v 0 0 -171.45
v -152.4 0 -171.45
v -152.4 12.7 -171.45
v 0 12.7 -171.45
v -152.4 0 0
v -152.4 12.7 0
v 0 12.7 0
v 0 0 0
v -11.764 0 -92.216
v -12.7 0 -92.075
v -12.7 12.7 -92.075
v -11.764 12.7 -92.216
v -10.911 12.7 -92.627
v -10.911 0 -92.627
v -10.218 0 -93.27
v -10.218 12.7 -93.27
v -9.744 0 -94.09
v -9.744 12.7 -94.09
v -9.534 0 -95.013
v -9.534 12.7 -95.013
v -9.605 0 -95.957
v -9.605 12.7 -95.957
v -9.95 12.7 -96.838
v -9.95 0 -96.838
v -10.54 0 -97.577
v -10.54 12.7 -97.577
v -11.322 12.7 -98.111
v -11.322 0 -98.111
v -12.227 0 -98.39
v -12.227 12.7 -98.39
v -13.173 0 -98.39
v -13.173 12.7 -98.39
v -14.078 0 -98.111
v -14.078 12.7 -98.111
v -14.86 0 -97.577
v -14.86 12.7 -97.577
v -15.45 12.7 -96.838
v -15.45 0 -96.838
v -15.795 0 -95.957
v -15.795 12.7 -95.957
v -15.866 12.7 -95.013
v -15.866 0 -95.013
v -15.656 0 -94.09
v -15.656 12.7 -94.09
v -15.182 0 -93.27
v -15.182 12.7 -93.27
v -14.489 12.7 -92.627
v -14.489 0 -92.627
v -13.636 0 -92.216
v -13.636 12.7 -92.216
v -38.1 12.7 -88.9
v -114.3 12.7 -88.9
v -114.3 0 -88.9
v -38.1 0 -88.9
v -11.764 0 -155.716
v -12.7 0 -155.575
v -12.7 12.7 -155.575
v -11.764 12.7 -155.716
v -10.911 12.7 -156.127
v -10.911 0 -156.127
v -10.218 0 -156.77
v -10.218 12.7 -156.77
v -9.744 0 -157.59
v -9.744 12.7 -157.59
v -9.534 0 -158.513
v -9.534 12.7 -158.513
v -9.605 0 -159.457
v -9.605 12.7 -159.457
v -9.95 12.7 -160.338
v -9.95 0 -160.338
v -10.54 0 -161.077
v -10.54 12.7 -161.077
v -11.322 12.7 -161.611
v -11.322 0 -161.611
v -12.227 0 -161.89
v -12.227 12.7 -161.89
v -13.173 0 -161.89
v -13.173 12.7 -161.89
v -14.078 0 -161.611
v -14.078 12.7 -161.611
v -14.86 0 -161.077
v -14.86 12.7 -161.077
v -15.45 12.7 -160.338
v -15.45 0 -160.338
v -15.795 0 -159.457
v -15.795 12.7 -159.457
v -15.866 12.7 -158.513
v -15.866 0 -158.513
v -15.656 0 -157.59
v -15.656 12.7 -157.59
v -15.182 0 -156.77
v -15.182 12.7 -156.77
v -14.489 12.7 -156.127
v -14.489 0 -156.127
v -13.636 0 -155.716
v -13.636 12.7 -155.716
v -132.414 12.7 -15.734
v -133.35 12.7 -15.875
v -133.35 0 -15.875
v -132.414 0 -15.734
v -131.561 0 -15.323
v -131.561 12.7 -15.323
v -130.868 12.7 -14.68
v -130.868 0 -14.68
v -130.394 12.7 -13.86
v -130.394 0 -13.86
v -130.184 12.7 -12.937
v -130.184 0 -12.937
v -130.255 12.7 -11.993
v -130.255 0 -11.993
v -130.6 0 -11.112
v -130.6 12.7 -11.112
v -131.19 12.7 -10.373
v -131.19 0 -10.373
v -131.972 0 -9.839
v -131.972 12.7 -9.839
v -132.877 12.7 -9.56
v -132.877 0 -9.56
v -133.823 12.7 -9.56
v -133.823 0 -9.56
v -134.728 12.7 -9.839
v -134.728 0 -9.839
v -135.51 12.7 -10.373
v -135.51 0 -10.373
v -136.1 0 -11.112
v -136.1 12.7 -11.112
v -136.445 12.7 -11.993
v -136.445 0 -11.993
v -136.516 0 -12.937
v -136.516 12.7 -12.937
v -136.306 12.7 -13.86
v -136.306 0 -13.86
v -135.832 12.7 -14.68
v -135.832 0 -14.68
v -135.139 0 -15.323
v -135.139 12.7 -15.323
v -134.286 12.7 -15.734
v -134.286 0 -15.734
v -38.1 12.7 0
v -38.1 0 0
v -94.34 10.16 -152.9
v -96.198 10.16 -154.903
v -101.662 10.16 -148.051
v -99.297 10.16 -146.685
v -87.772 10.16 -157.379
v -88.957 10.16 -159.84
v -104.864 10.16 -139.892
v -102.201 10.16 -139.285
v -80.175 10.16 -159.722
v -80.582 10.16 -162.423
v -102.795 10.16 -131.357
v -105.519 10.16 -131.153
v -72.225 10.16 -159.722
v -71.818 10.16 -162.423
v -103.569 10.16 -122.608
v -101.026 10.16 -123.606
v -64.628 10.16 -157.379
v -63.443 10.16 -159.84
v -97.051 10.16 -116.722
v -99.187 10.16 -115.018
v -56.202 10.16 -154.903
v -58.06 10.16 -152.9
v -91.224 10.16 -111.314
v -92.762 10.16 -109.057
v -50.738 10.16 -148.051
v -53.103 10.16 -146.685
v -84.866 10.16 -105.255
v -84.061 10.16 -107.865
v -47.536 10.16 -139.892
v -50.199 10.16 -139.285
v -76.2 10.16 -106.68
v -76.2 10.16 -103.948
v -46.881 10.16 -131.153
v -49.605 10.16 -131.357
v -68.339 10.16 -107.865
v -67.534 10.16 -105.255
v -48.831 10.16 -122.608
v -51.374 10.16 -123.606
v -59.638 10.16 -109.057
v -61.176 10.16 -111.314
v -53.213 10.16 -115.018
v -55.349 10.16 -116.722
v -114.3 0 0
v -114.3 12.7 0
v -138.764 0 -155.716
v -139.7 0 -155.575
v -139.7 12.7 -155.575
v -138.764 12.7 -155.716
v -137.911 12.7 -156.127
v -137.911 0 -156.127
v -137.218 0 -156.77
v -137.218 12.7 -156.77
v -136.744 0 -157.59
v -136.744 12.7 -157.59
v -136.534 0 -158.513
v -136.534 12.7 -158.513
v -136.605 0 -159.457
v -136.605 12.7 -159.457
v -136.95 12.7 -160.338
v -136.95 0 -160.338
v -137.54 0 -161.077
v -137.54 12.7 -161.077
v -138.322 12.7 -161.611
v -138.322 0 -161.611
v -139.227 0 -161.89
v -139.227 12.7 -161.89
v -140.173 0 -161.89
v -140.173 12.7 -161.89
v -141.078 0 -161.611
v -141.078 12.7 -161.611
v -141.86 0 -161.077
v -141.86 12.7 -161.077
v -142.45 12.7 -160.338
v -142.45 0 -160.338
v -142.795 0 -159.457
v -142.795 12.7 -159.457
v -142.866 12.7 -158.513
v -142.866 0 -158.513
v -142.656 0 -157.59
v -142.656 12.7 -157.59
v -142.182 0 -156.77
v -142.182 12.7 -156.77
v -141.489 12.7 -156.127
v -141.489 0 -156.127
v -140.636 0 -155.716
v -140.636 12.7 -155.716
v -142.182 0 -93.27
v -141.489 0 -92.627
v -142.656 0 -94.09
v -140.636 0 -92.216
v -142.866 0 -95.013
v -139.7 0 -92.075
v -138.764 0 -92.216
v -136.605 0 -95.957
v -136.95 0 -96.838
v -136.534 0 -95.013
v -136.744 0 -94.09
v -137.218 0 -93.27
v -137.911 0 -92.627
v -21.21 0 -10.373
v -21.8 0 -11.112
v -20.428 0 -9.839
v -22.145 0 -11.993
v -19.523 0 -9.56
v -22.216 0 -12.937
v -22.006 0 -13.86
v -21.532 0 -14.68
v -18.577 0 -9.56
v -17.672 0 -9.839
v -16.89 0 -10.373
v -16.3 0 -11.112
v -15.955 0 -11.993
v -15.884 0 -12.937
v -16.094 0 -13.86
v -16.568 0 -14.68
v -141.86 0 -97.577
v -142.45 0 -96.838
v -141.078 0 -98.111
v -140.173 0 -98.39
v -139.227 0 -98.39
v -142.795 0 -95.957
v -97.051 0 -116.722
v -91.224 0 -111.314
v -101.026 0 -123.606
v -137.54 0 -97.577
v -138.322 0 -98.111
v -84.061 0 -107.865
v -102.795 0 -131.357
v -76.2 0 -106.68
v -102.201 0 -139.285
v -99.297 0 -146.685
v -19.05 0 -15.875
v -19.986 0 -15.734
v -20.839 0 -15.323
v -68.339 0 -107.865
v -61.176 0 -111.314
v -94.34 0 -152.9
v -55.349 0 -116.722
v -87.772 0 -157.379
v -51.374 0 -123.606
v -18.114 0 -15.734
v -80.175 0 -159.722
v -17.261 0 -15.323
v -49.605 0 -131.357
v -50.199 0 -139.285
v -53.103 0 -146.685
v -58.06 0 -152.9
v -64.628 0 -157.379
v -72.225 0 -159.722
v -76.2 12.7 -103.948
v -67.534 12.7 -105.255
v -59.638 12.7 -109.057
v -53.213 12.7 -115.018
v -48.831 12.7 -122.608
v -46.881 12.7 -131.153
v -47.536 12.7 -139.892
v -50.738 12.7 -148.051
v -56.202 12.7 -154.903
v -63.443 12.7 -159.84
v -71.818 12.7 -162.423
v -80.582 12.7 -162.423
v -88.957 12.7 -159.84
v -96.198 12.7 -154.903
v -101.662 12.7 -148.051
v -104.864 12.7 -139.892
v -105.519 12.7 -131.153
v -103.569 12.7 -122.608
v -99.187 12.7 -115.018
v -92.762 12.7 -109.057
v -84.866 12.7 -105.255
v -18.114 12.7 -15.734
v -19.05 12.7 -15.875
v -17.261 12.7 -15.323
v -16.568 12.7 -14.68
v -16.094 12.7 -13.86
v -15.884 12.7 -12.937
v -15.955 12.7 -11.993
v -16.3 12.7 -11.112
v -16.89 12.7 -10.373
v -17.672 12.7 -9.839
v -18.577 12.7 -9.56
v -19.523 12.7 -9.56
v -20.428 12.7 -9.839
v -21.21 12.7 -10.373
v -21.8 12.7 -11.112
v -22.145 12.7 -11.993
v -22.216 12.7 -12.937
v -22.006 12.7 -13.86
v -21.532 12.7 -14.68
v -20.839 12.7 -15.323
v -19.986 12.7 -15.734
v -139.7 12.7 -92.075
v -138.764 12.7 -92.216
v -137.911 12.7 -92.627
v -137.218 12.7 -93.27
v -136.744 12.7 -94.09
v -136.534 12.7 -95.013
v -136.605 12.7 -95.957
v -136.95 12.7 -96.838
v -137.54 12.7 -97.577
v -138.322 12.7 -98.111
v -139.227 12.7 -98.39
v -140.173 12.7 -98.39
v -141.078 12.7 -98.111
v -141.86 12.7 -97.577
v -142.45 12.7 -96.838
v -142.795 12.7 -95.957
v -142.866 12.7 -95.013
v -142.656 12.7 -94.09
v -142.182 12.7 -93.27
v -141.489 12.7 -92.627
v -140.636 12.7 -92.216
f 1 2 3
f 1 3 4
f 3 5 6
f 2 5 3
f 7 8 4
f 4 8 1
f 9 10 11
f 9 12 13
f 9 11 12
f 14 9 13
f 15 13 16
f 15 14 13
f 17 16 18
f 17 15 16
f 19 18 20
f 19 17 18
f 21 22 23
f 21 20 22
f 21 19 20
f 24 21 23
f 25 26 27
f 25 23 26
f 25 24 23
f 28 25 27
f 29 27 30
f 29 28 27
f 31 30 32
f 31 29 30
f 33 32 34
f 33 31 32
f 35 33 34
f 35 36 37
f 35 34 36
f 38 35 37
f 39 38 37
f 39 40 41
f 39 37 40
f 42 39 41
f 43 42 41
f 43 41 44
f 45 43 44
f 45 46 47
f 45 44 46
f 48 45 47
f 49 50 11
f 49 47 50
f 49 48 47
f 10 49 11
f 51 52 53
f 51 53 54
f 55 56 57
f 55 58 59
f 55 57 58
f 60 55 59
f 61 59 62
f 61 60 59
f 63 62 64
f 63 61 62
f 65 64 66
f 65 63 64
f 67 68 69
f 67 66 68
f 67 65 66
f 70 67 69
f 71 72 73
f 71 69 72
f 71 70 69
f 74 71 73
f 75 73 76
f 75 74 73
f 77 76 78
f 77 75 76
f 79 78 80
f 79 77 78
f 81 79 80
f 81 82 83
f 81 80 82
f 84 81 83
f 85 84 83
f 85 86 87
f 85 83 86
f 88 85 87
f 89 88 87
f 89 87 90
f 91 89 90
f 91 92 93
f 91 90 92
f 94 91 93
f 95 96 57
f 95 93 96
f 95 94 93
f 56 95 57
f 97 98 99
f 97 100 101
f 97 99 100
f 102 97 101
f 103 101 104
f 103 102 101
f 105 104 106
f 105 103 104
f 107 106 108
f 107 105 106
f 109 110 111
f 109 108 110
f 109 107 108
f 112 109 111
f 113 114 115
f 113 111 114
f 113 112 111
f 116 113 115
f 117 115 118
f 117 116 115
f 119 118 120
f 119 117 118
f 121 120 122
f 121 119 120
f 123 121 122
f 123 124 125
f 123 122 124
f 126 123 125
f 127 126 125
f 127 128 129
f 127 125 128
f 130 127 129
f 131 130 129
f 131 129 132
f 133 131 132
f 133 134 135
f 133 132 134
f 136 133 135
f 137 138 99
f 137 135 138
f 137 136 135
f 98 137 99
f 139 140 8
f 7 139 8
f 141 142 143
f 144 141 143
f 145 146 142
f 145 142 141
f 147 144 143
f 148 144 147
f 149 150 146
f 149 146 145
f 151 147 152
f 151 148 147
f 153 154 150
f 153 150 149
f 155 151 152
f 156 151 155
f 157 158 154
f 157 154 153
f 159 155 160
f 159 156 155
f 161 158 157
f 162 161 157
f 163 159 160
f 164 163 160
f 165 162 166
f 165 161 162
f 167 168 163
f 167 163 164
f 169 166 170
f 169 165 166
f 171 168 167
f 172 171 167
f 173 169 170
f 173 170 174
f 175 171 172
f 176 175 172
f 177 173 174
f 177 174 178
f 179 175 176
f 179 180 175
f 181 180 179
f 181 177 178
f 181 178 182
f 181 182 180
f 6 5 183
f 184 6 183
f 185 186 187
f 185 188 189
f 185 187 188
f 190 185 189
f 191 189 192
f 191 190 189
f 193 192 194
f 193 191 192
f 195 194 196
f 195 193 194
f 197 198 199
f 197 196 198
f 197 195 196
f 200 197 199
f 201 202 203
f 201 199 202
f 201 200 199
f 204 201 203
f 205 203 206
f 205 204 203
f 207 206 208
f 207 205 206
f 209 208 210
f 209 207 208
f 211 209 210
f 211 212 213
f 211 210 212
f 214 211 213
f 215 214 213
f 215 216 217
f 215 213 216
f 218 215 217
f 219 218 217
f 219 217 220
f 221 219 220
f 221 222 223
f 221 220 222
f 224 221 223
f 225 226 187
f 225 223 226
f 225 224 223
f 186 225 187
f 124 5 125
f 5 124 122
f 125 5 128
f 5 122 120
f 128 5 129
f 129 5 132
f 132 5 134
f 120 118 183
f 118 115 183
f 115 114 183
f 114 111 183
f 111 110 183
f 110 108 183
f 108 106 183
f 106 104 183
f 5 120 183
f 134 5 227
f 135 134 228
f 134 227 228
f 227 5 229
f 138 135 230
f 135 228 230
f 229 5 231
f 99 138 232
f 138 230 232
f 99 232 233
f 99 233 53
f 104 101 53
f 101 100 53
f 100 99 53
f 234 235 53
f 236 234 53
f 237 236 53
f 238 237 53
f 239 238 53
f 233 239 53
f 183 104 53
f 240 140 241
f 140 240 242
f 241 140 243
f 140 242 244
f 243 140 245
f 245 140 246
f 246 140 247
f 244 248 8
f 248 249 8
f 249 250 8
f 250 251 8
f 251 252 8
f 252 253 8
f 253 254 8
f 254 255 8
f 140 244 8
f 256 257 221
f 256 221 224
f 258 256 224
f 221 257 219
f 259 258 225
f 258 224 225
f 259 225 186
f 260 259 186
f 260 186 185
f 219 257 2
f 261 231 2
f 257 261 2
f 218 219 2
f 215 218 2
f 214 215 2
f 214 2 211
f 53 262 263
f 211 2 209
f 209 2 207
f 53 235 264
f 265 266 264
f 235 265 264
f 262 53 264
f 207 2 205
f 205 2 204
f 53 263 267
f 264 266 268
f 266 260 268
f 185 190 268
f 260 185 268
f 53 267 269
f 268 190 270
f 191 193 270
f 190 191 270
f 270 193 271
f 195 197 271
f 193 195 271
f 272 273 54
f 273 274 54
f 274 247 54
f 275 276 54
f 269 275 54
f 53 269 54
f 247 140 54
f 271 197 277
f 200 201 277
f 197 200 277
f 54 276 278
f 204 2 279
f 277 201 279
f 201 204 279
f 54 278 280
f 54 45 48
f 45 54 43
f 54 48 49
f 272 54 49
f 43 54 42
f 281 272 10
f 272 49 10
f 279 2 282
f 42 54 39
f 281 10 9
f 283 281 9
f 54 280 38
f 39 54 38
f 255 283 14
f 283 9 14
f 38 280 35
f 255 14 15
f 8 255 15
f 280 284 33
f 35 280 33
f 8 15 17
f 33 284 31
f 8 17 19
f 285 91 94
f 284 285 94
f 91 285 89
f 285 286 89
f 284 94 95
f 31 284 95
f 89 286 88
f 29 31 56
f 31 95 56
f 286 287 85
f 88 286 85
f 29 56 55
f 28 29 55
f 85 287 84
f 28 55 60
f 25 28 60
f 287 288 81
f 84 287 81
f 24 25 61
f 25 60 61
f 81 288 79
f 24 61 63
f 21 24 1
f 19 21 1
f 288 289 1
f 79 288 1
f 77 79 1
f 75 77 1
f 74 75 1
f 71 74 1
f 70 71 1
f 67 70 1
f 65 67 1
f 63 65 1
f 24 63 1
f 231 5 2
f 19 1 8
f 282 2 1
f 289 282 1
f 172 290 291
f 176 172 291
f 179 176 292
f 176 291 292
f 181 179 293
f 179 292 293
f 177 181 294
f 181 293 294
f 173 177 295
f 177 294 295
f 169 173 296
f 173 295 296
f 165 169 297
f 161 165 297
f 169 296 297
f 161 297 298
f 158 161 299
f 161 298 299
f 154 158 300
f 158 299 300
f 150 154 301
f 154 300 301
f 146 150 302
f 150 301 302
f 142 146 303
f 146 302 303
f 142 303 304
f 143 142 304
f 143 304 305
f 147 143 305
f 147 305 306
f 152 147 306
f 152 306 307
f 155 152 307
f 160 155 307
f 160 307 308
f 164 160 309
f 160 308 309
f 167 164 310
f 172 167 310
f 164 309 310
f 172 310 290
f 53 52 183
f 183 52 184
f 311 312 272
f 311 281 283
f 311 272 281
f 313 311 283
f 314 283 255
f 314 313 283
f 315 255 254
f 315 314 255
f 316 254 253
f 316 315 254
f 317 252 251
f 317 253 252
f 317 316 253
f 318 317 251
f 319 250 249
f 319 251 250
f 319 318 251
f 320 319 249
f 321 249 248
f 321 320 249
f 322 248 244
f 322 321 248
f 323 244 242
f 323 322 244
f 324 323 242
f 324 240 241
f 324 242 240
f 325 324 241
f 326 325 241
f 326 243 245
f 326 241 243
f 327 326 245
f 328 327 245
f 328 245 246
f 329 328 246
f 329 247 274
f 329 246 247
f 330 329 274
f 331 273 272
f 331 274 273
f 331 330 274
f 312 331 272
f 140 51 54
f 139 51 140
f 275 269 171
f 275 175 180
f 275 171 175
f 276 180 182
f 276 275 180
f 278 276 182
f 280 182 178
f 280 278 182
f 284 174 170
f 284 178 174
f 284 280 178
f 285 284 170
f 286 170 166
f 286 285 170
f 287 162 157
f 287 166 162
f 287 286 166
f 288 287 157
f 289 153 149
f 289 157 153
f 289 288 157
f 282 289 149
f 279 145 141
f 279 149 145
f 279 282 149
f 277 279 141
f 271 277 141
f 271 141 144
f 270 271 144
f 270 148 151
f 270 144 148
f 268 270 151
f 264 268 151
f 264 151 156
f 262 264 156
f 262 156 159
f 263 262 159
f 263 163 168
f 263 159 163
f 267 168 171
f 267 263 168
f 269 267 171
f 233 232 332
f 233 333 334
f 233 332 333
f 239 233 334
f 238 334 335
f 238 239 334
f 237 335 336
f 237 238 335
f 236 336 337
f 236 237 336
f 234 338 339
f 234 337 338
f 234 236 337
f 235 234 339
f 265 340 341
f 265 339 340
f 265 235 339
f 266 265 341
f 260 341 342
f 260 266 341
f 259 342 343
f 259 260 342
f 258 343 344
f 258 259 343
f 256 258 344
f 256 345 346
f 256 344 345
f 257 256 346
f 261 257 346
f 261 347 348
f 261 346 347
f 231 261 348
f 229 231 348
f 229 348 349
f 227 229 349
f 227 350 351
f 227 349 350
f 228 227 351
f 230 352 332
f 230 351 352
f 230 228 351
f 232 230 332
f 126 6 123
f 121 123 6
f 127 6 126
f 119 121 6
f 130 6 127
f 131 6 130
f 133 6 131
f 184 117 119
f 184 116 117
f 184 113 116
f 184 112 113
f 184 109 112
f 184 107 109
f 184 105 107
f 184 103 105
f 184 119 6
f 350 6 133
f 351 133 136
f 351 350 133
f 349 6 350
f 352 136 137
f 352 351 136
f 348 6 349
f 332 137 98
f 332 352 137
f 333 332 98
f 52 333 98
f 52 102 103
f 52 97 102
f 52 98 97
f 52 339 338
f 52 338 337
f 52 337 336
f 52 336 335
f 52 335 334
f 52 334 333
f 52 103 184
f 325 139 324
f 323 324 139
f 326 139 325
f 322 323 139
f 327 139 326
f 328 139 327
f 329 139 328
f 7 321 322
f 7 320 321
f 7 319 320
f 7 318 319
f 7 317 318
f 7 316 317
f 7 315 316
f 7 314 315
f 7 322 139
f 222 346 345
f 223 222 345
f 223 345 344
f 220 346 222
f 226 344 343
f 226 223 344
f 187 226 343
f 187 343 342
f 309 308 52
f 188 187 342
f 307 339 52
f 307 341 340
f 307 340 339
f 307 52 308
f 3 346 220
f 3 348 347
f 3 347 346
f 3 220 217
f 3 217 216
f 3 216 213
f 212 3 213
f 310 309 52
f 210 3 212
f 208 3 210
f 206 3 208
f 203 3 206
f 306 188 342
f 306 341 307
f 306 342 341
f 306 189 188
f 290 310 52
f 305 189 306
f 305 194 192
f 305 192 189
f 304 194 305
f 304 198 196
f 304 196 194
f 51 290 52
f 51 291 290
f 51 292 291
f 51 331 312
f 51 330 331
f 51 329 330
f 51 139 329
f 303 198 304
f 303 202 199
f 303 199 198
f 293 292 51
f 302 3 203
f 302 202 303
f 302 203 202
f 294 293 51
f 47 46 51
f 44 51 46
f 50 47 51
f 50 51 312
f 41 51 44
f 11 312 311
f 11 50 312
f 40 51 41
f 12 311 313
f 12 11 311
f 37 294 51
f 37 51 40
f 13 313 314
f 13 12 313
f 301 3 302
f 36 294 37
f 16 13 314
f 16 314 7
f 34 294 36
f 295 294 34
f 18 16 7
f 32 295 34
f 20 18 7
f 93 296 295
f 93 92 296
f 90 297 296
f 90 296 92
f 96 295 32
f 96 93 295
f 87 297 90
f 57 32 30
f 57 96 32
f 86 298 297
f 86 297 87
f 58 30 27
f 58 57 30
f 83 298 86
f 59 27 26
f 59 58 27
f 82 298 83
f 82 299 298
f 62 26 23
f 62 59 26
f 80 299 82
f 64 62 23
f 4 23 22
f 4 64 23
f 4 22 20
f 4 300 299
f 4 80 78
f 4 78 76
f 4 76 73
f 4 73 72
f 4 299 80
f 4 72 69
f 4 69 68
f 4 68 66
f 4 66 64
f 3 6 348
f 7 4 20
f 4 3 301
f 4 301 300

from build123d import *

# Parameters (mm, degrees)
SKETCH1_W               = 152.4
SKETCH1_H               = 171.45
BOSS_EXTRUDE1_DEPTH     = 12.7
CUT_EXTRUDE1_DEPTH      = 230.743666942
CUT_EXTRUDE1_DEPTH_BACK = 230.743666942
SKETCH2_R               = 26.67
CUT_EXTRUDE2_DEPTH      = 230.743666942
CUT_EXTRUDE2_DEPTH_BACK = 230.743666942
SKETCH3_R               = 3.175
SKETCH4_R               = 29.401540703
CUT_EXTRUDE3_DEPTH      = 2.54
CUT_EXTRUDE4_DEPTH      = 230.743666942
CUT_EXTRUDE4_DEPTH_BACK = 230.743666942
SKETCH5_W               = 76.2
SKETCH5_H               = 88.9
CUT_EXTRUDE5_DEPTH      = 230.743666942
CUT_EXTRUDE5_DEPTH_BACK = 230.743666942
SKETCH7_R               = 3.175


with BuildPart() as part:
    # Sketch1 → Boss-Extrude1 (new body)
    with BuildSketch(Plane(origin=(0, 0, 0), x_dir=(1, 0, 0), z_dir=(0, 1, 0))):
        with Locations((-76.2, 85.725)):
            Rectangle(SKETCH1_W, SKETCH1_H)
    extrude(amount=BOSS_EXTRUDE1_DEPTH)

    # Sketch2 → Cut-Extrude1 (cut, two sides: drawn at the far end of the back side and taken through both)
    with BuildSketch(Plane(origin=(0, 12.7, 0), x_dir=(1, 0, 0), z_dir=(0, 1, 0)).offset(-CUT_EXTRUDE1_DEPTH_BACK)):
        with Locations(Location((-76.2, 133.35, 0), (0, 0, 270))):
            Circle(SKETCH2_R)
    extrude(amount=CUT_EXTRUDE1_DEPTH + CUT_EXTRUDE1_DEPTH_BACK, mode=Mode.SUBTRACT)

    # Sketch3 → Cut-Extrude2 (cut, two sides: drawn at the far end of the back side and taken through both)
    with BuildSketch(Plane(origin=(0, 12.7, 0), x_dir=(1, 0, 0), z_dir=(0, 1, 0)).offset(-CUT_EXTRUDE2_DEPTH_BACK)):
        with Locations(Location((-139.7, 158.75, 0), (0, 0, 270))):
            Circle(SKETCH3_R)
        with Locations(Location((-12.7, 158.75, 0), (0, 0, 270))):
            Circle(SKETCH3_R)
        with Locations(Location((-12.7, 95.25, 0), (0, 0, 270))):
            Circle(SKETCH3_R)
        with Locations(Location((-139.7, 95.25, 0), (0, 0, 270))):
            Circle(SKETCH3_R)
    extrude(amount=CUT_EXTRUDE2_DEPTH + CUT_EXTRUDE2_DEPTH_BACK, mode=Mode.SUBTRACT)

    # Sketch4 → Cut-Extrude3 (cut)
    with BuildSketch(Plane(origin=(0, 12.7, 0), x_dir=(1, 0, 0), z_dir=(0, 1, 0))):
        with Locations(Location((-76.2, 133.35, 0), (0, 0, 270))):
            Circle(SKETCH4_R)
    extrude(amount=-CUT_EXTRUDE3_DEPTH, mode=Mode.SUBTRACT)

    # Sketch5 → Cut-Extrude4 (cut, two sides: drawn at the far end of the back side and taken through both)
    with BuildSketch(Plane.XZ.offset(-CUT_EXTRUDE4_DEPTH_BACK)):
        with Locations((-76.2, -44.45)):
            Rectangle(SKETCH5_W, SKETCH5_H)
    extrude(amount=CUT_EXTRUDE4_DEPTH + CUT_EXTRUDE4_DEPTH_BACK, mode=Mode.SUBTRACT)

    # Sketch7 → Cut-Extrude5 (cut, two sides: drawn at the far end of the back side and taken through both)
    with BuildSketch(Plane.XZ.offset(-CUT_EXTRUDE5_DEPTH_BACK)):
        with Locations(Location((-19.05, -12.7, 0), (0, 0, 270))):
            Circle(SKETCH7_R)
        with Locations(Location((-133.35, -12.7, 0), (0, 0, 270))):
            Circle(SKETCH7_R)
    extrude(amount=CUT_EXTRUDE5_DEPTH + CUT_EXTRUDE5_DEPTH_BACK, mode=Mode.SUBTRACT)


solid = part.part
